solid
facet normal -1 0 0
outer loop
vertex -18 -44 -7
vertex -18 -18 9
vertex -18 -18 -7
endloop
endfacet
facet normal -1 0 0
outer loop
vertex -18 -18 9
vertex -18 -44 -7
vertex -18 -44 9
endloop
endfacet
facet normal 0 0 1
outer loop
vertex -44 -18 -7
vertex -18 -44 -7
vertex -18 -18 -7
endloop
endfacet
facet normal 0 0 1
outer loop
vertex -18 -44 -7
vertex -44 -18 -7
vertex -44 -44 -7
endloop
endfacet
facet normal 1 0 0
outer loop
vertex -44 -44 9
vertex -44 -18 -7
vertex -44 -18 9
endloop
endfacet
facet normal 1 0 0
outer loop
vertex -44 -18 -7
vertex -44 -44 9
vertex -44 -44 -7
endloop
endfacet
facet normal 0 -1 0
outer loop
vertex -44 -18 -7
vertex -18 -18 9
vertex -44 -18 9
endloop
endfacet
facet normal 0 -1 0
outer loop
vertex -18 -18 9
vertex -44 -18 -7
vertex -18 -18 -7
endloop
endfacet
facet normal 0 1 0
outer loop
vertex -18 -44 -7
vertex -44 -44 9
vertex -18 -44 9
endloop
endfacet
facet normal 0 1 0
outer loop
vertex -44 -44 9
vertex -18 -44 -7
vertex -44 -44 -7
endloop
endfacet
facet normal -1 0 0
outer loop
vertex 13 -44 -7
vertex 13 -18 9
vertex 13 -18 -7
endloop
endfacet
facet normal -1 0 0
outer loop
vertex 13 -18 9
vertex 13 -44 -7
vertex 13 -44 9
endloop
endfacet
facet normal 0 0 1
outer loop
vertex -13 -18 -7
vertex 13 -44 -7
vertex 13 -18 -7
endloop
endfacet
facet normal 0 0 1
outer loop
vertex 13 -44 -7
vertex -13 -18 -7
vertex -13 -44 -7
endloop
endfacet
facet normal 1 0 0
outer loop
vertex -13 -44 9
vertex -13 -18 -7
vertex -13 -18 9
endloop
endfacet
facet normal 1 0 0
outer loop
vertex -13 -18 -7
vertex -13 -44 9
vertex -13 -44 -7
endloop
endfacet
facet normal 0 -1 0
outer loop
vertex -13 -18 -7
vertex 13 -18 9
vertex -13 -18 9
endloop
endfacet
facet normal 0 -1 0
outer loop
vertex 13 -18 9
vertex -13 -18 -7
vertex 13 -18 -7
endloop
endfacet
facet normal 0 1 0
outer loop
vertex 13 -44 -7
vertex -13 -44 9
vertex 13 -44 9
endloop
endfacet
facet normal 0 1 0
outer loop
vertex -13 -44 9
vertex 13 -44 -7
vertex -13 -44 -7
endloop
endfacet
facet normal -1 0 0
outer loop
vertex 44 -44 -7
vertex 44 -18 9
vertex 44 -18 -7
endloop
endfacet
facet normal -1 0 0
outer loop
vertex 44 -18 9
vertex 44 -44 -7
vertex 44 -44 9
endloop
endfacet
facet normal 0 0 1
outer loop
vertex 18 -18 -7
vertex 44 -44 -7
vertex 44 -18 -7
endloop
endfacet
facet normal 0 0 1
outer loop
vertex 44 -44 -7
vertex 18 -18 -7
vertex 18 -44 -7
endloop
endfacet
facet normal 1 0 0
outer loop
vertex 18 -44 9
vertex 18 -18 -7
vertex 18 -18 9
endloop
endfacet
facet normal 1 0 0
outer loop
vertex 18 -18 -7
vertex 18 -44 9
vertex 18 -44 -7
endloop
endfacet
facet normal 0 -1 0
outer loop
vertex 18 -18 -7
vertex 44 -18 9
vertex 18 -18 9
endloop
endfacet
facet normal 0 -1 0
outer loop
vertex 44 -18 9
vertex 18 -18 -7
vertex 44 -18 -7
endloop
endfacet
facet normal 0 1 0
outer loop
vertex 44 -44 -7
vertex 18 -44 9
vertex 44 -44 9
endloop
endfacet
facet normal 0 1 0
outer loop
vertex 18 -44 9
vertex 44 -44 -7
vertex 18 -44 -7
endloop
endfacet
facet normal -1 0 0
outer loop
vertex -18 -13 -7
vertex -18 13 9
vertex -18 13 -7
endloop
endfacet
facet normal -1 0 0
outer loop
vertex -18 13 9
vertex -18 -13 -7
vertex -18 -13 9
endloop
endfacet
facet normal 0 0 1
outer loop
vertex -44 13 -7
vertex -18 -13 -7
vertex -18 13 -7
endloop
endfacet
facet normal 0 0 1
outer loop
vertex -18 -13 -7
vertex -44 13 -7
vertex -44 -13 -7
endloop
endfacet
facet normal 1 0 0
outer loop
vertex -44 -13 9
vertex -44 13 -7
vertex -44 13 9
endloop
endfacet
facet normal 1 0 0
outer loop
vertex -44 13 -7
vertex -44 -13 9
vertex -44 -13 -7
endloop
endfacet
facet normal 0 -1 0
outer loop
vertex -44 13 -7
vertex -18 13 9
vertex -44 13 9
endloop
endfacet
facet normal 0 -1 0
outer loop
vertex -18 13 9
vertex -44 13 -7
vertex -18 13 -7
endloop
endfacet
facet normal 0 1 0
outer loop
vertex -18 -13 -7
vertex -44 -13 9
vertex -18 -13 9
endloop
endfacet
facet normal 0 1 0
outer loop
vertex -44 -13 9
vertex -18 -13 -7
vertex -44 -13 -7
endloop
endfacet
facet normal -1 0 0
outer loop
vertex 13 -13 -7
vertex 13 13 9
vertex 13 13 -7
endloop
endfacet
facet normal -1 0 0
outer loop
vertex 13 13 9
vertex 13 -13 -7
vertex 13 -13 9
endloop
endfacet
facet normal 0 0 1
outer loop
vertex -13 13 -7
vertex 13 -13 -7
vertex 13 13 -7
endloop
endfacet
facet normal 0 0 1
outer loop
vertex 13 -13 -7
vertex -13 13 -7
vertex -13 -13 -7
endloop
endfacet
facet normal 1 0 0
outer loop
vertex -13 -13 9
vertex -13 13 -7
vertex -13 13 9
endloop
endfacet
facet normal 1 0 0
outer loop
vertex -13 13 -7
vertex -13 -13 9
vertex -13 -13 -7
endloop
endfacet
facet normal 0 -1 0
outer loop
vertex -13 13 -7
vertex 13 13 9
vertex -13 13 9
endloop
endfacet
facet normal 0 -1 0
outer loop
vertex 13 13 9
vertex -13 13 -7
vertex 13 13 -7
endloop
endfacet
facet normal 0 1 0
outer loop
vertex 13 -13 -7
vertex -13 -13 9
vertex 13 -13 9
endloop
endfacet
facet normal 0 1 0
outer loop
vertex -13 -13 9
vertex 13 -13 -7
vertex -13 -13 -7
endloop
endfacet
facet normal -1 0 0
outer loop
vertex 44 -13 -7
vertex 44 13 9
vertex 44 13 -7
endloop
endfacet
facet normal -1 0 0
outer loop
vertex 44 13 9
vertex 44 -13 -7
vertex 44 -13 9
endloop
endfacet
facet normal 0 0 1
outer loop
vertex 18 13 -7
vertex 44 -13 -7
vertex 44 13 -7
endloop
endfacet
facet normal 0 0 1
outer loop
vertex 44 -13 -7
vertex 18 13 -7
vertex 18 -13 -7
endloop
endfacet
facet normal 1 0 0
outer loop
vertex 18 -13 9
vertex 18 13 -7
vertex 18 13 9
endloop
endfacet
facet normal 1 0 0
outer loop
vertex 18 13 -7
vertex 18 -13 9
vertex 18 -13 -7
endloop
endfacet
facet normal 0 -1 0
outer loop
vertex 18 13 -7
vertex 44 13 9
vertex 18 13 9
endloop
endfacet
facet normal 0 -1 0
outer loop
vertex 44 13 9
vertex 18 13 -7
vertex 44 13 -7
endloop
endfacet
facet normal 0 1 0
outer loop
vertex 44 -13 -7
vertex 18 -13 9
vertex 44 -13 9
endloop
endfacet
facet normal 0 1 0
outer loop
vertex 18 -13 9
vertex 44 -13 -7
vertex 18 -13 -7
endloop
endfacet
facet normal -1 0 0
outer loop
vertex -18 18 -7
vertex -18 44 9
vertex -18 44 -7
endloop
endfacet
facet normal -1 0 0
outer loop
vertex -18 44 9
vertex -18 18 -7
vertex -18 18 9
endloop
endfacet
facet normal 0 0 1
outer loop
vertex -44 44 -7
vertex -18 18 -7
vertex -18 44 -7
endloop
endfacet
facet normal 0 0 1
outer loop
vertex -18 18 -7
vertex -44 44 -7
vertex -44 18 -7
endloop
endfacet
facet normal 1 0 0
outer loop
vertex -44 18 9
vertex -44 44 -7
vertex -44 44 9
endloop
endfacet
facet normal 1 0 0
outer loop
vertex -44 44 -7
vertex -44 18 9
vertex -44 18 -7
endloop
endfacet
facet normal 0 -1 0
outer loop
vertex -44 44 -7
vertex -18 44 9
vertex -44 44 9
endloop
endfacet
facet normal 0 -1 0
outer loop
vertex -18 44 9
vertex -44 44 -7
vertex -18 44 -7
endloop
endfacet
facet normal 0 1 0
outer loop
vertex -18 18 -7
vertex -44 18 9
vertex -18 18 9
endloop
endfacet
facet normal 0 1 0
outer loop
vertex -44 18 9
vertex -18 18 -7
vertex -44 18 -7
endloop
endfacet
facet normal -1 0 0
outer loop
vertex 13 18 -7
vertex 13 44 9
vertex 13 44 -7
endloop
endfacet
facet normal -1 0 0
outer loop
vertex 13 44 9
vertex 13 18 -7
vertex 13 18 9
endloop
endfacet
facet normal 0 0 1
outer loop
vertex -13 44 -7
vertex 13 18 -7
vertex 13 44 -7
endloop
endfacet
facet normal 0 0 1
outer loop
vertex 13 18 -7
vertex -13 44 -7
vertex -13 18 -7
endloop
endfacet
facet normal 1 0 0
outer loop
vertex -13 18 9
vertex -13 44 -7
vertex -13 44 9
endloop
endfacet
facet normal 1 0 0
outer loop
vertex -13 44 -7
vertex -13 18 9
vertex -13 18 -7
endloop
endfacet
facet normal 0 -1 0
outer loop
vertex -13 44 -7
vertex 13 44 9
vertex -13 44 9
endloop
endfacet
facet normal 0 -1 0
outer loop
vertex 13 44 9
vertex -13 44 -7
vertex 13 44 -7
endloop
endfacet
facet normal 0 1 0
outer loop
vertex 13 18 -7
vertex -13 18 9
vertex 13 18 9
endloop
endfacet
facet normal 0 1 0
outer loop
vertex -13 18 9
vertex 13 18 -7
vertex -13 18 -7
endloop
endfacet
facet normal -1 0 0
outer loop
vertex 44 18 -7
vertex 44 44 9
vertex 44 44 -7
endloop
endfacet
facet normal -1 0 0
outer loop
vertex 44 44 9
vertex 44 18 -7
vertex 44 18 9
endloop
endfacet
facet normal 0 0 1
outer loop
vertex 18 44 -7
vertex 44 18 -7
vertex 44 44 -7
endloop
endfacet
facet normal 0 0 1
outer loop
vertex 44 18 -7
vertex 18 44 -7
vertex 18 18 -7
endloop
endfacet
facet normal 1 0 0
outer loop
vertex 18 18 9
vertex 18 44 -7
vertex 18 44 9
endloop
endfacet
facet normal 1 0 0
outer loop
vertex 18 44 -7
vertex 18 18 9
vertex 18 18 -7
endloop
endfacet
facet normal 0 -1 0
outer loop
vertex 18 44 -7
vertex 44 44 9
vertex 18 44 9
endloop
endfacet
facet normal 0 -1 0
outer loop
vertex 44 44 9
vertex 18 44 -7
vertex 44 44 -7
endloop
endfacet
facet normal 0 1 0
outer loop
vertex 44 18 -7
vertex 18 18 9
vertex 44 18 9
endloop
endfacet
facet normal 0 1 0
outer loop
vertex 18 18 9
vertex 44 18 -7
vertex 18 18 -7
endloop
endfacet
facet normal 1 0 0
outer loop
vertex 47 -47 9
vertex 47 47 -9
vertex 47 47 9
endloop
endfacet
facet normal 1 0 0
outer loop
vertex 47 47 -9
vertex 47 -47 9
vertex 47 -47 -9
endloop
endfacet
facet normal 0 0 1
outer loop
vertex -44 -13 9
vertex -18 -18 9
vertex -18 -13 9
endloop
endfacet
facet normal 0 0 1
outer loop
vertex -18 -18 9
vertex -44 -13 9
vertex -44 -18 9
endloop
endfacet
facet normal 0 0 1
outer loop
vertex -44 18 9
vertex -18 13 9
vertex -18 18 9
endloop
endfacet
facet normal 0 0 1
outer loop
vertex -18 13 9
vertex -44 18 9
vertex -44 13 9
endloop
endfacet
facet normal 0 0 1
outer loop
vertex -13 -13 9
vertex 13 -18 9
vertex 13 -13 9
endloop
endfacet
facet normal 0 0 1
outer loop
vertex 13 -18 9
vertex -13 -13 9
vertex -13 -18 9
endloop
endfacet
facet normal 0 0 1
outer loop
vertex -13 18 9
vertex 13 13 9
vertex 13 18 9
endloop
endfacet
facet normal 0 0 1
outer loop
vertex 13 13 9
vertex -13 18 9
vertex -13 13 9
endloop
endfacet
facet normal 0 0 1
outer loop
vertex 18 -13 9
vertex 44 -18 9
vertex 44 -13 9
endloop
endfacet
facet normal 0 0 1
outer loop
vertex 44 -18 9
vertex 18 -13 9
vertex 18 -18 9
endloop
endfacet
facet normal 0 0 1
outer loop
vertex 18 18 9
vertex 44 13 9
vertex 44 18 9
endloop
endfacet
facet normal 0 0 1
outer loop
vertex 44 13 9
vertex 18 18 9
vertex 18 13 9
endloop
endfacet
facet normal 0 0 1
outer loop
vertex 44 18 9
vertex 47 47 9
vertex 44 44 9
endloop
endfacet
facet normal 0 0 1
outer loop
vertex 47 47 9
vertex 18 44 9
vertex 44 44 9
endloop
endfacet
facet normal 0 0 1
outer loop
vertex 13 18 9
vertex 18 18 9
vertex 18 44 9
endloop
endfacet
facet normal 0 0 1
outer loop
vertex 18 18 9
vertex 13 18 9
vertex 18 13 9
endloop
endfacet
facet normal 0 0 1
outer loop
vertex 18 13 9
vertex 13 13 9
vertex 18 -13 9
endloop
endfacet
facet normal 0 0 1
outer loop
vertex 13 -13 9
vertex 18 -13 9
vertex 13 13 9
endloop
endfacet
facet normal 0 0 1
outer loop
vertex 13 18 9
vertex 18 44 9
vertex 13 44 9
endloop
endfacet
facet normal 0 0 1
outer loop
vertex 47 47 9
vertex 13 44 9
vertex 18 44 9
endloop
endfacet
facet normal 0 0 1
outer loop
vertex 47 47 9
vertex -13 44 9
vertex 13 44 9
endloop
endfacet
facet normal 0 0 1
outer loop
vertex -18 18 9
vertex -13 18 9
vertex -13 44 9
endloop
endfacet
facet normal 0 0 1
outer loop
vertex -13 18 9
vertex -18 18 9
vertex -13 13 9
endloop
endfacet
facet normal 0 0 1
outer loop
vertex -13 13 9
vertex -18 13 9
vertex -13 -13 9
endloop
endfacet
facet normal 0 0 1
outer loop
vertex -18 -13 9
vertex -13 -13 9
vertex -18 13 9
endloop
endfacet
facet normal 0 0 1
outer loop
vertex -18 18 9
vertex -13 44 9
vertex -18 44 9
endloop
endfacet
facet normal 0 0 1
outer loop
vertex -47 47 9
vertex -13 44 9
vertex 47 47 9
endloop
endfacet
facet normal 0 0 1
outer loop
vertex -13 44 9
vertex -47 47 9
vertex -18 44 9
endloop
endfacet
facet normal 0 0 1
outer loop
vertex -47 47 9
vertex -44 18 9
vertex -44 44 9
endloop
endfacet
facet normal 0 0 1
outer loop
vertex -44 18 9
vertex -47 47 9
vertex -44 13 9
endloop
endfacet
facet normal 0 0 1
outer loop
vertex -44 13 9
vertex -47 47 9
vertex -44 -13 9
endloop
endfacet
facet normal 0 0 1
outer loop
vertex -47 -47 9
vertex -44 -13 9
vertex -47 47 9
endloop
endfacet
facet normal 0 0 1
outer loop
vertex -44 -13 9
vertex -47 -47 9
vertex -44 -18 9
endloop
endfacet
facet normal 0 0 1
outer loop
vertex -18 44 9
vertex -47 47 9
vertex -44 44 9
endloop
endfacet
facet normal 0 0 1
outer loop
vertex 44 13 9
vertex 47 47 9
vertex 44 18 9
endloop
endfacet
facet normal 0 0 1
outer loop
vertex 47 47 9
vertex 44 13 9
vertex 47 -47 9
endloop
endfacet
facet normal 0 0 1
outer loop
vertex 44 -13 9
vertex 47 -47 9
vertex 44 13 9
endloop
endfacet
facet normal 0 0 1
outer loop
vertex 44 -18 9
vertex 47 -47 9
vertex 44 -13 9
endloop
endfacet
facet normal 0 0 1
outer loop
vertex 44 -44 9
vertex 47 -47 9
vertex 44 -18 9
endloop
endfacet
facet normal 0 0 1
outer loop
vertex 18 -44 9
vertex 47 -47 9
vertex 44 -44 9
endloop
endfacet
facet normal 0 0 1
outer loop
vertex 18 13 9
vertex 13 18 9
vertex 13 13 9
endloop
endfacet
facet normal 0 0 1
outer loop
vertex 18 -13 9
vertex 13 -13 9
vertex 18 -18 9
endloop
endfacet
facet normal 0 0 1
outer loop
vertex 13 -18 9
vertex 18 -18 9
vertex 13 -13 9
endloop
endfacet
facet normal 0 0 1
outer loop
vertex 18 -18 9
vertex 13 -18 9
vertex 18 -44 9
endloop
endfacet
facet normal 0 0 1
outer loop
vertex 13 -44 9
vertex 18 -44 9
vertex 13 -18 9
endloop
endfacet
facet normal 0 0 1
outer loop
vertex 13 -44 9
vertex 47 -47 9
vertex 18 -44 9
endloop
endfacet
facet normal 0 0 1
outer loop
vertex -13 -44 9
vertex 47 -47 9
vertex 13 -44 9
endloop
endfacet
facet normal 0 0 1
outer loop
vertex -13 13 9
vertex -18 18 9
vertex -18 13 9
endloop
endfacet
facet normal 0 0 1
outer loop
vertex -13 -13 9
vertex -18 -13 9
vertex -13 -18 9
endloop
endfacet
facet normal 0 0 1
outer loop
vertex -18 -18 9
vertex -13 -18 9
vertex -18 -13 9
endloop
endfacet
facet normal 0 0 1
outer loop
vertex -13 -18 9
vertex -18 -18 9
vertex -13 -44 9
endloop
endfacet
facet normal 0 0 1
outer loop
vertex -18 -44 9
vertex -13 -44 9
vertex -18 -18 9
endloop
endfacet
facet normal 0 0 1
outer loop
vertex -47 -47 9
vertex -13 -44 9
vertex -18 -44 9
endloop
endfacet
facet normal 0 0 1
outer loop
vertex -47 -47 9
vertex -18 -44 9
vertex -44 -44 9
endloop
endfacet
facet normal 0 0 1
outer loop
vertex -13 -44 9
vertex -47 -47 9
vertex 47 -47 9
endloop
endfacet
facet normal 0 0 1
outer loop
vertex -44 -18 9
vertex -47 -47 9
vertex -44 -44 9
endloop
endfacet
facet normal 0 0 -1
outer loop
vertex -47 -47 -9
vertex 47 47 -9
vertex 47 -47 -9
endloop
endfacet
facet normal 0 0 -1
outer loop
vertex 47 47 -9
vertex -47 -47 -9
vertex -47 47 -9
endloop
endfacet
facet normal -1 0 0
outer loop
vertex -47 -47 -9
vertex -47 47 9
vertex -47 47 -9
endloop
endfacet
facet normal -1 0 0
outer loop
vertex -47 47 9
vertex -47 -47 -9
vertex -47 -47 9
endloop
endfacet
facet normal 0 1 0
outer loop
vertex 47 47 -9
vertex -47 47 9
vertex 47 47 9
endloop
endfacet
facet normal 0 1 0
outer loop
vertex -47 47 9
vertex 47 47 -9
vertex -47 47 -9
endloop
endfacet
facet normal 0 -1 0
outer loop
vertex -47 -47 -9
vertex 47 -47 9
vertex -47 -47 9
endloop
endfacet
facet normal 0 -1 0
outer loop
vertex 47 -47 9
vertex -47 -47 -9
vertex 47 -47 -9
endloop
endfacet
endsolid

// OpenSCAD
$fn = 32;

// ----------------------------------------------------------------------
// Pocket plate 94 x 94 x 18
// 3 x 3 pockets 26 mm square, 16 mm deep
// ----------------------------------------------------------------------

// --- parameters (mm) ---
thickness = 18;  // plate thickness
floor_t = 2;     // material left under each pocket
pocket = 26;     // pocket side length
pitch_x = 31;    // pocket pitch along X
pitch_y = 31;    // pocket pitch along Y
cols = 3;        // pockets per row
rows = 3;        // rows of pockets

// --- derived feature positions (mm) ---
depth = thickness - floor_t;        // = 16   pocket depth, down to the floor
span_x = (cols - 1) * pitch_x;      // = 62   distance between outer pockets
span_y = (rows - 1) * pitch_y;      // = 62   distance between outer pocket rows
origin_x = -span_x / 2;             // = -31   X of the first pocket
origin_y = -span_y / 2;             // = -31   Y of the first pocket
plate = [span_x + pocket + 6, span_y + pocket + 6, thickness];  // = [94, 94, 18]   overall size: pockets plus 3 mm of wall on each side
feature_centers = [
  [origin_x + 0 * pitch_x, origin_y + 0 * pitch_y],
  [origin_x + 1 * pitch_x, origin_y + 0 * pitch_y],
  [origin_x + 2 * pitch_x, origin_y + 0 * pitch_y],
  [origin_x + 0 * pitch_x, origin_y + 1 * pitch_y],
  [origin_x + 1 * pitch_x, origin_y + 1 * pitch_y],
  [origin_x + 2 * pitch_x, origin_y + 1 * pitch_y],
  [origin_x + 0 * pitch_x, origin_y + 2 * pitch_y],
  [origin_x + 1 * pitch_x, origin_y + 2 * pitch_y],
  [origin_x + 2 * pitch_x, origin_y + 2 * pitch_y]
];   // pocket centres, used verbatim by the cutter loop

// plate outline, then one pocket per centre in feature_centers
difference() {
  cube(plate, center = true);
  for (centre = feature_centers)
    translate([centre[0] - pocket / 2, centre[1] - pocket / 2, plate[2] / 2 - depth])
      cube([pocket, pocket, depth + 1]);  // centred on the declared pocket centre
}
